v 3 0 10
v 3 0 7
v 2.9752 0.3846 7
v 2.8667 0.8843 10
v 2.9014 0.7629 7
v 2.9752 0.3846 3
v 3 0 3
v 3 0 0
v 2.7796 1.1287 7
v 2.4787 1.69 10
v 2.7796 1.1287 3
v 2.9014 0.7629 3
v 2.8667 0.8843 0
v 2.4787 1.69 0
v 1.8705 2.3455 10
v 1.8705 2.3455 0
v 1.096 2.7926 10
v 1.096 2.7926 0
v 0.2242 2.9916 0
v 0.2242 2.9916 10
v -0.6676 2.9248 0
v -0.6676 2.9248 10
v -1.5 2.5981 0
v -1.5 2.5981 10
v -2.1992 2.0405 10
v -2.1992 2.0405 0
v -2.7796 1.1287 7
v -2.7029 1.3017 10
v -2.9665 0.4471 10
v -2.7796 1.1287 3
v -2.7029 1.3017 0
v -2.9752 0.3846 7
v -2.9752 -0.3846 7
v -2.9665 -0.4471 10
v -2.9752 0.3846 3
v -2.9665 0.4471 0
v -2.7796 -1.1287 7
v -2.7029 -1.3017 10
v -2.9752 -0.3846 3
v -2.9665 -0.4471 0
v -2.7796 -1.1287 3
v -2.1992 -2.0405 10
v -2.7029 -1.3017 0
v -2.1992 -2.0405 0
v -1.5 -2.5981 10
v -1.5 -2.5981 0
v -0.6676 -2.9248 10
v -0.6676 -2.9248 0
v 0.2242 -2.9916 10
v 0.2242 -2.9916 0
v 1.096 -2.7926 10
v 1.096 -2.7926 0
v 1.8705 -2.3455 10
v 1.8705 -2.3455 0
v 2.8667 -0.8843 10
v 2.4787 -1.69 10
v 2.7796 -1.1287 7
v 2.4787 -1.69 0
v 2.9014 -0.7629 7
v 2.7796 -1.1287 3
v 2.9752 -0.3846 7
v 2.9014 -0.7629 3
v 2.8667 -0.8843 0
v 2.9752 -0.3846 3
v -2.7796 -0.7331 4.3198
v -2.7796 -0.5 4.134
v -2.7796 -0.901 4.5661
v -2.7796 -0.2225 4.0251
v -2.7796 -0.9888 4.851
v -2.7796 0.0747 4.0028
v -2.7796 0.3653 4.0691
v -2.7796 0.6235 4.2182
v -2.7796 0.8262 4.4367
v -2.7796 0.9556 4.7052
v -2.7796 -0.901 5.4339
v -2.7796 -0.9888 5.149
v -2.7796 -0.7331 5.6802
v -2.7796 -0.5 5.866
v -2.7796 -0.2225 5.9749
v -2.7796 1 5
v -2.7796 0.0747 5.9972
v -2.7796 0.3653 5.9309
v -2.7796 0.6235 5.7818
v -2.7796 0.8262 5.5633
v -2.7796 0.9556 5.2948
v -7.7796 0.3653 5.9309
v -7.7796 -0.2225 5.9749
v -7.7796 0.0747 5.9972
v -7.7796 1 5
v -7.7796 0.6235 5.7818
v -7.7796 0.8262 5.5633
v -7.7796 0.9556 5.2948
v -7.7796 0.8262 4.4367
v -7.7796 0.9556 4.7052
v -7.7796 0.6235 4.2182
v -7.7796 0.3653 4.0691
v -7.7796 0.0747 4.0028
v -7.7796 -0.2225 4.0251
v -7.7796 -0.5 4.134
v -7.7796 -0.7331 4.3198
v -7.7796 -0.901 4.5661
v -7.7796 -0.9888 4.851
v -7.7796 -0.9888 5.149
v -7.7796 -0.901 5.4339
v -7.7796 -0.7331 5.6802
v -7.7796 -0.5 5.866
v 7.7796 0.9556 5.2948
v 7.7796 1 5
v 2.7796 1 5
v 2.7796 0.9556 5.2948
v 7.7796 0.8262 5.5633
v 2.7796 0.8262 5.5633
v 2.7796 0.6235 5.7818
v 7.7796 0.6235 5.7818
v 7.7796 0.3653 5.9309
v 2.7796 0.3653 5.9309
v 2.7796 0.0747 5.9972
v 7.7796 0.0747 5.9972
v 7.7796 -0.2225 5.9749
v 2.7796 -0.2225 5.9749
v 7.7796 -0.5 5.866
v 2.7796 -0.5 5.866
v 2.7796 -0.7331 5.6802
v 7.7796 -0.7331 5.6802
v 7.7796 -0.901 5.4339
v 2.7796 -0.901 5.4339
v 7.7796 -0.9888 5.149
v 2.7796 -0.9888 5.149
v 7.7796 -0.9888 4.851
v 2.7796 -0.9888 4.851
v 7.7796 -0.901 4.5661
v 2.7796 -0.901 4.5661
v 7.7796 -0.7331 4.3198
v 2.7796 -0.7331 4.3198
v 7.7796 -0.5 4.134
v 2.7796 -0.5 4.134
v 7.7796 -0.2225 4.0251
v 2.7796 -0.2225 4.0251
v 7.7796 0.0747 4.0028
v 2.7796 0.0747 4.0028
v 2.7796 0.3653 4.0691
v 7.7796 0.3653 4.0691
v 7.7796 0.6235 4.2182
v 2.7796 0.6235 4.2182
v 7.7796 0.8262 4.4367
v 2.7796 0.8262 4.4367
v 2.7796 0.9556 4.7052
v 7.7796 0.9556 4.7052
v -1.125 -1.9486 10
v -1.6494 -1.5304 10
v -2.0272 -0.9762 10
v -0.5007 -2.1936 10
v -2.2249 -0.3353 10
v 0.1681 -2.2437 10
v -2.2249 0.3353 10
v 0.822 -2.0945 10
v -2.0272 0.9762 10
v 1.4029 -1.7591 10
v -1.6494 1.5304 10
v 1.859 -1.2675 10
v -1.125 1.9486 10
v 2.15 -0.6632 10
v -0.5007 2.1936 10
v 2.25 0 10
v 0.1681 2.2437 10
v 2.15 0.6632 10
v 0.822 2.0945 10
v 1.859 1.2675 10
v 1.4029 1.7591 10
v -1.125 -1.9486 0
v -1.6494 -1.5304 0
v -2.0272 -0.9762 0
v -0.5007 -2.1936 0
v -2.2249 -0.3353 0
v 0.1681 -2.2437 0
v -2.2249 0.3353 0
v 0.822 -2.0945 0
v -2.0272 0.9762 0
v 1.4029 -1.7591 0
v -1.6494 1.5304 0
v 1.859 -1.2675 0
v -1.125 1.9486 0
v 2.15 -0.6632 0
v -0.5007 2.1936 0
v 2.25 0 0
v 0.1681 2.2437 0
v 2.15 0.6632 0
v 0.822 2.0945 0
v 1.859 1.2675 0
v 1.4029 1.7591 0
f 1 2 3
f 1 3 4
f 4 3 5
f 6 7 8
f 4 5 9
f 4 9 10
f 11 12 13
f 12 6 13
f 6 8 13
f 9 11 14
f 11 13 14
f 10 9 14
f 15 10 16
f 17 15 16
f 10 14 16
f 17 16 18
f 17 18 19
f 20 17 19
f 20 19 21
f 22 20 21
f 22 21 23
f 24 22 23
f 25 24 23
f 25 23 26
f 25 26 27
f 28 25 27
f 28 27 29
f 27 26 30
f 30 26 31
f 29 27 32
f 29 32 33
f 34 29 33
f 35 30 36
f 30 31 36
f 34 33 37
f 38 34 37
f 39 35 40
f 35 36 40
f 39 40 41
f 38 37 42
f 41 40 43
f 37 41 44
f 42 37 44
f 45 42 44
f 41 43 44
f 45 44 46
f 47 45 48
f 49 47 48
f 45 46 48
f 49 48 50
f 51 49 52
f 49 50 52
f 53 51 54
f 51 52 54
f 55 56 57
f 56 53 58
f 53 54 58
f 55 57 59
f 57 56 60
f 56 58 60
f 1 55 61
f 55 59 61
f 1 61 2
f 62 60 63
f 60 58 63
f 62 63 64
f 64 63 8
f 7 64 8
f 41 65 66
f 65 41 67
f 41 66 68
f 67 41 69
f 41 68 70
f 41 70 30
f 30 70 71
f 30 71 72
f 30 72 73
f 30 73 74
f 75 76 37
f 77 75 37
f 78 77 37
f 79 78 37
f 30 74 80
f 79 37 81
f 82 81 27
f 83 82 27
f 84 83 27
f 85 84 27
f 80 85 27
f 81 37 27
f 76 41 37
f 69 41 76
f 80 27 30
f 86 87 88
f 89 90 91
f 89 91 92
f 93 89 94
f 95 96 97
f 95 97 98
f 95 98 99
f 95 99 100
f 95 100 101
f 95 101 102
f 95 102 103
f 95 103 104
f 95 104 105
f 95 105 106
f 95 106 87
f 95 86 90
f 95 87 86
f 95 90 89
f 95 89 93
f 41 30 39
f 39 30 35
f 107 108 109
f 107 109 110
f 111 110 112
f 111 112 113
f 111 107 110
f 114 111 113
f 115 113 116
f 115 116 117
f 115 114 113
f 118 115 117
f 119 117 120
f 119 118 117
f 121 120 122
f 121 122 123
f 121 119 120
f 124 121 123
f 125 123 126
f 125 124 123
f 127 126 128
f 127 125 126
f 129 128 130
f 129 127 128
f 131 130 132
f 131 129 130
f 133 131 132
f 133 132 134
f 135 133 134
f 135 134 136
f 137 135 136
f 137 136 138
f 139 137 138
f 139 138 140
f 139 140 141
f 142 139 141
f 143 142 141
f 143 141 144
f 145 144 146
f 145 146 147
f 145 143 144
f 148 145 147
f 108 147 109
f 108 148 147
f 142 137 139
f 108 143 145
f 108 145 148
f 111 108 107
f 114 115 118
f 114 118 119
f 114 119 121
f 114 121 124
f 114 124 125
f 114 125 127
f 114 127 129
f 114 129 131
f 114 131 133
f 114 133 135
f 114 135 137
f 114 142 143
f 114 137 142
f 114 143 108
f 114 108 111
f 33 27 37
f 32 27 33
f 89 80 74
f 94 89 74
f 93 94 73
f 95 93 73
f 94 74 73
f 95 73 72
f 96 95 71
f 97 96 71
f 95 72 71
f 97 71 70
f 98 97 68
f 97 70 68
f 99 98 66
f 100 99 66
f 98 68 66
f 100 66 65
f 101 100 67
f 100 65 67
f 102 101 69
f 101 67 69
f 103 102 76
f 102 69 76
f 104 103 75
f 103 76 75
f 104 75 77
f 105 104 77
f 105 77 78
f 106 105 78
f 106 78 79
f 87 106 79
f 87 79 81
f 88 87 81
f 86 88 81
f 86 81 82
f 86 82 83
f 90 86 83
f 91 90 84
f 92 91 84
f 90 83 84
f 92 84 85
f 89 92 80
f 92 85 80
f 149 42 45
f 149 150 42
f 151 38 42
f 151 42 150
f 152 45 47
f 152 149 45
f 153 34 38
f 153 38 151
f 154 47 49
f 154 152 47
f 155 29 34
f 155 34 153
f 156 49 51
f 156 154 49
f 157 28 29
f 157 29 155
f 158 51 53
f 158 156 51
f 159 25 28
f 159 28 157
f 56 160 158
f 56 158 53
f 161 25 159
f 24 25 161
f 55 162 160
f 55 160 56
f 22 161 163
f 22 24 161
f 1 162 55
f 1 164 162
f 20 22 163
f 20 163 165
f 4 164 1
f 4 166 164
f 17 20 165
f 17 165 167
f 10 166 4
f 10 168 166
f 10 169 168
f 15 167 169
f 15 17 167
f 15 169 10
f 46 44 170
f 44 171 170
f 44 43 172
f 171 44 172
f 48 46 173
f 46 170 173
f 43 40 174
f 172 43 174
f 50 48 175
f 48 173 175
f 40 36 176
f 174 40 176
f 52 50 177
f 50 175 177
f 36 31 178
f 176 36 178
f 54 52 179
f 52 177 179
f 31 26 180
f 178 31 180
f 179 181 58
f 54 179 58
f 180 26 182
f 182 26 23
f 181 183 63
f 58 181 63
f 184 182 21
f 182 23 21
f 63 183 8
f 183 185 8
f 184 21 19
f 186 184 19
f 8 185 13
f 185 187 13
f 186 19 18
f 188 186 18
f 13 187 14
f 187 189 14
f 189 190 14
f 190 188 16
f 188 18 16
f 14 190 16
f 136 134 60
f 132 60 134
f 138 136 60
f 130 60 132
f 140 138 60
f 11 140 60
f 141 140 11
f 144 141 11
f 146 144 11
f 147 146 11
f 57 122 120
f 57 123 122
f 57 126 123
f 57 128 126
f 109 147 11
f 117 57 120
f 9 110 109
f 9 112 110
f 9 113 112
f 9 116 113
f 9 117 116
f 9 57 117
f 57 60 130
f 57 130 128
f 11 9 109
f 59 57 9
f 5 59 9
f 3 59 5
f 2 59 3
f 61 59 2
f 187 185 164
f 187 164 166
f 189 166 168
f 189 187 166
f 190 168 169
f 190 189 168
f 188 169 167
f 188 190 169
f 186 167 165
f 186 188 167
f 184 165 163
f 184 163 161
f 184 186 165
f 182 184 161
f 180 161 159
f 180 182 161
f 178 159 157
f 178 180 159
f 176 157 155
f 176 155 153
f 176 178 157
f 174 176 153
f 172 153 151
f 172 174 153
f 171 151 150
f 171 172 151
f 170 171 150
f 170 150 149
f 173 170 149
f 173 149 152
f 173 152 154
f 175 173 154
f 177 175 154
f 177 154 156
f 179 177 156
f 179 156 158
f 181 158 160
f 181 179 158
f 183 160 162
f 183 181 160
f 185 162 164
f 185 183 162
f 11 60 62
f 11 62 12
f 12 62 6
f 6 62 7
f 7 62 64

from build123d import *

# Parameters (mm, degrees)
SKETCH1_R           = 3
SKETCH1_R_2         = 2.25
BOSS_EXTRUDE1_DEPTH = 10
CUT_EXTRUDE3_START  = -3
SKETCH2_W           = 1.120885769
SKETCH2_H           = 2.257305728
CUT_EXTRUDE3_DEPTH  = 4
SKETCH3_R           = 1
BOSS_EXTRUDE2_DEPTH = 5
BOSS_EXTRUDE3_START = 5
SKETCH4_R           = 1
BOSS_EXTRUDE3_DEPTH = 5


with BuildPart() as part:
    # Sketch1 → Boss-Extrude1 (new body)
    with BuildSketch(Plane.XY):
        Circle(SKETCH1_R)
        Circle(SKETCH1_R_2, mode=Mode.SUBTRACT)
    extrude(amount=BOSS_EXTRUDE1_DEPTH)

    # Sketch2 → Cut-Extrude3 (cut)
    with BuildSketch(Plane.XY.offset(10).offset(CUT_EXTRUDE3_START)):
        with Locations((-3.340036868, 0)):
            Rectangle(SKETCH2_W, SKETCH2_H)
        with Locations((3.340036868, 0)):
            Rectangle(SKETCH2_W, SKETCH2_H)
    extrude(amount=-CUT_EXTRUDE3_DEPTH, mode=Mode.SUBTRACT)

    # Sketch3 → Boss-Extrude2 (add)
    with BuildSketch(Plane.ZY.offset(2.779593983)):
        with Locations(Location((5, 0, 0), (0, 0, 90))):
            Circle(SKETCH3_R)
    extrude(amount=BOSS_EXTRUDE2_DEPTH)

    # Sketch4 → Boss-Extrude3 (add)
    with BuildSketch(Plane(origin=(2.779593983, 0, 0), x_dir=(0, 0, -1), z_dir=(1, 0, 0)).offset(BOSS_EXTRUDE3_START)):
        with Locations(Location((-5, 0, 0), (0, 0, 90))):
            Circle(SKETCH4_R)
    extrude(amount=-BOSS_EXTRUDE3_DEPTH)


solid = part.part
